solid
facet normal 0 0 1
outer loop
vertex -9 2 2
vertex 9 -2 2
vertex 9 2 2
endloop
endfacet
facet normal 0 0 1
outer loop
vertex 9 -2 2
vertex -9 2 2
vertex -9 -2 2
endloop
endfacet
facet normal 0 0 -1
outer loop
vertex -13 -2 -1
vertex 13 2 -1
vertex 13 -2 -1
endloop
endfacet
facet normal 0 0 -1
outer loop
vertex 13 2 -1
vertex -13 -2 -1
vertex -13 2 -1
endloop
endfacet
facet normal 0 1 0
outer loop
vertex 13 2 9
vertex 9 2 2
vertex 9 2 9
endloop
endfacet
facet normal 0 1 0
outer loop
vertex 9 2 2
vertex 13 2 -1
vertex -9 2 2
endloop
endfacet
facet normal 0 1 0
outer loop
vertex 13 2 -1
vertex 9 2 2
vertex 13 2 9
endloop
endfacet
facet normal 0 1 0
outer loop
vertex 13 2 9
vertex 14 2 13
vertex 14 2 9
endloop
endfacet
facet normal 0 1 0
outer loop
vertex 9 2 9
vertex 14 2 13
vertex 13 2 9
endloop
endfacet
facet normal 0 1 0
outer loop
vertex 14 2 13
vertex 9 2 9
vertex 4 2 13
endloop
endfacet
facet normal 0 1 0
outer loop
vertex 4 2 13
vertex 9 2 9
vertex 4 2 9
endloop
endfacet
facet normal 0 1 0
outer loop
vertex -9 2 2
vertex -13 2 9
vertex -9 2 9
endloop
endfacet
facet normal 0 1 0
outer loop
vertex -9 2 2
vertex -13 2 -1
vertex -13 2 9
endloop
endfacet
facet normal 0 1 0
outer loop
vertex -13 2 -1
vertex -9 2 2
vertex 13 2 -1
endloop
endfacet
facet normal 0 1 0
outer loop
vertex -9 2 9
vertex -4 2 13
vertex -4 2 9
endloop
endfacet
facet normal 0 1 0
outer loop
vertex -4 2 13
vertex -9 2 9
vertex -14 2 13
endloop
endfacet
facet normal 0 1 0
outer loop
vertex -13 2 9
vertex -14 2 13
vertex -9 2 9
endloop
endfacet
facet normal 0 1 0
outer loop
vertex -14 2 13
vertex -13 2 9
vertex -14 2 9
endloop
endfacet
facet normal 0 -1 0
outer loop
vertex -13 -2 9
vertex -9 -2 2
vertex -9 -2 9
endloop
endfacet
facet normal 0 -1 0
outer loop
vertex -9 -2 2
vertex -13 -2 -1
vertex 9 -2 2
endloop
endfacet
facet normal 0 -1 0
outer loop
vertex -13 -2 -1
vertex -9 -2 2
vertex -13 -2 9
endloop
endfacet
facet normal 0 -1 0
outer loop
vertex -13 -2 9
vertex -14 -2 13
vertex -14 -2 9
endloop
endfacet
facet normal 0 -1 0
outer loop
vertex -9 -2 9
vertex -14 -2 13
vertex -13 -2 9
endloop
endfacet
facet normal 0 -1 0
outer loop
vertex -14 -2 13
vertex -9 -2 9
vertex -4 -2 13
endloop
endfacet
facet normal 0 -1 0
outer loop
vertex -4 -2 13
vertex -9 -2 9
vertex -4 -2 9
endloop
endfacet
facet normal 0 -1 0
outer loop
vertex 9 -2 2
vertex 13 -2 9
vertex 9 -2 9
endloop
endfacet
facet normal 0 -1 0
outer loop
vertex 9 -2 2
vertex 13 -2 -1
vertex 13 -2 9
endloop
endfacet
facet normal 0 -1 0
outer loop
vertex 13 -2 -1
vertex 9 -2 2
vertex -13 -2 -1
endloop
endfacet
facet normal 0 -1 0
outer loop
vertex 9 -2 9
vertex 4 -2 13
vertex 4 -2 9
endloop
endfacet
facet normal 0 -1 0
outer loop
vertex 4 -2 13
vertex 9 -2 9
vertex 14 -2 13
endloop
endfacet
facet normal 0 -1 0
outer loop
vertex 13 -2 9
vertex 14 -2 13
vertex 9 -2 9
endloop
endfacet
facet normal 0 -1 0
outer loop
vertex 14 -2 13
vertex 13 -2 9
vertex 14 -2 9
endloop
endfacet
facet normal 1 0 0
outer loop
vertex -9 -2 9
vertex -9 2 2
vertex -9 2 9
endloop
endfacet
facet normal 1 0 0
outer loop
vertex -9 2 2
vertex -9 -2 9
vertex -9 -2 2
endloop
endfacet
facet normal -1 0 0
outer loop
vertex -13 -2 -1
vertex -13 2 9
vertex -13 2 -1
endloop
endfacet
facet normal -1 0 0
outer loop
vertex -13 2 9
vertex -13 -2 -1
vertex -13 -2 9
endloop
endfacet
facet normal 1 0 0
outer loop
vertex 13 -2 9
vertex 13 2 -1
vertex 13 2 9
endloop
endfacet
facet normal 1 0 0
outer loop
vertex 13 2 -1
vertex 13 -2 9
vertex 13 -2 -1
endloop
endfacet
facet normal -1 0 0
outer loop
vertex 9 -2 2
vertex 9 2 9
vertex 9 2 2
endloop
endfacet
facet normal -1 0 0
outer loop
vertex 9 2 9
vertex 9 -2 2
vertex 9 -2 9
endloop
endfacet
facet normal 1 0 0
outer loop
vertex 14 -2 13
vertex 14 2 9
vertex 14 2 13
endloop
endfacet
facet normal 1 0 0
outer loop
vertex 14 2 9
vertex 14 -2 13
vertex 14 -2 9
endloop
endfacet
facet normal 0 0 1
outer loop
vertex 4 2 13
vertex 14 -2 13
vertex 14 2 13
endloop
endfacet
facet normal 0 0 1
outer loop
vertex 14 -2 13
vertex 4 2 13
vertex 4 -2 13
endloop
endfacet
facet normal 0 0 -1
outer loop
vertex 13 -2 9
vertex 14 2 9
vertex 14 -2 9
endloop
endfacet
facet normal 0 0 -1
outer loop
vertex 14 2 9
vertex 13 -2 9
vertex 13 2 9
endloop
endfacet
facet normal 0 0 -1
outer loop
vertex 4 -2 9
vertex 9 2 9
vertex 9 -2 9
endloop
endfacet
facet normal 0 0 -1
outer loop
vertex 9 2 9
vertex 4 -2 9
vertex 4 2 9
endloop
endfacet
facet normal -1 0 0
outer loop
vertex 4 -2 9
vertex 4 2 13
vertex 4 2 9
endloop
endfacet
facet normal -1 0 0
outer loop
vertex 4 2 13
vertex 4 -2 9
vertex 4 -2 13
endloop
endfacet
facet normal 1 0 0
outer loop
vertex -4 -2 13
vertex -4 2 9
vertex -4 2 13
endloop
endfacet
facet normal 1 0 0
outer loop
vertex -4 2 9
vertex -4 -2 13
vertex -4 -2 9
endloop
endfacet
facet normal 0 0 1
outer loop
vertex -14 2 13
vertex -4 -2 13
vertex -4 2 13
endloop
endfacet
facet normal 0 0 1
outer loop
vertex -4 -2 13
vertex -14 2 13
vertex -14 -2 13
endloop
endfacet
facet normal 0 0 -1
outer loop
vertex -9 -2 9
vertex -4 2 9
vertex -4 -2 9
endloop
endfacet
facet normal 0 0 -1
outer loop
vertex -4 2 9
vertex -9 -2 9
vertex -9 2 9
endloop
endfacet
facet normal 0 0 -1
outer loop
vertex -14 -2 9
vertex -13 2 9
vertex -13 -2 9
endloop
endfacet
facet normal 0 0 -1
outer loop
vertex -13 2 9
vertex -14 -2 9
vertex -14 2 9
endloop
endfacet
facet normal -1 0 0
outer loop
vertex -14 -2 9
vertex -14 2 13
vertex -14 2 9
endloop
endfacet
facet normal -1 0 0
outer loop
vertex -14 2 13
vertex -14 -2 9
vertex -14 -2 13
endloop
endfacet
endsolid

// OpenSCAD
/*
 * Zwölf Tunken Adapter Clip
 * Copyright (c) 2025 Lone Dynamics Corporation. All rights reserved.
 *
 * This works best when printed with TPU filament.
 *
 */
 
 
tunken_clip();

//translate([0,0,8]) rotate([0,0,90]) zwolf();
//translate([0,0,5]) tunken();

module tunken_clip() {
 
    translate([0,0,0.5]) cube([20,4,3], center=true);
    translate([-16/2-3,0,5]) cube([4,4,12], center=true);
    translate([16/2+3,0,5]) cube([4,4,12], center=true);
     
    translate([16/2+1,0,11]) cube([10,4,4], center=true);
    translate([-16/2-1,0,11]) cube([10,4,4], center=true);
     
 }

module tunken() {
    color([1,0,0]) cube([16,16.5,5], center=true);
}
 
module zwolf(height = 1.6)
{
	 
	translate([0,-2.25,0])
		linear_extrude(1)
			text("zwölf", size=2, halign="center", font="Lato:style=Black");

	 difference() {
		 
		union () {
			color([0,1,0]) cube([16,13.5,height], center=true);
			translate([-6.35,4,0]) color([1,1,0]) cube([1.7,5,height+0.01], center=true);
			translate([-6.35,-4,-0.01]) color([1,1,0]) cube([1.7,5,height+0.01], center=true);
			translate([-3.81,4,0]) color([1,1,0]) cube([1.7,5,height+0.01], center=true);
			translate([-3.81,-4,-0.01]) color([1,1,0]) cube([1.7,5,height+0.01], center=true);
			translate([-1.27,4,0]) color([1,1,0]) cube([1.7,5,height+0.01], center=true);
			translate([-1.27,-4,-0.01]) color([1,1,0]) cube([1.7,5,height+0.01], center=true);
			translate([1.27,4,0]) color([1,1,0]) cube([1.7,5,height+0.01], center=true);
			translate([1.27,-4,-0.01]) color([1,1,0]) cube([1.7,5,height+0.01], center=true);
			translate([3.81,4,0]) color([1,1,0]) cube([1.7,5,height+0.01], center=true);
			translate([3.81,-4,-0.01]) color([1,1,0]) cube([1.7,5,height+0.01], center=true);
			translate([6.35,4,0]) color([1,1,0]) cube([1.7,5,height+0.01], center=true);
			translate([6.35,-4,-0.01]) color([1,1,0]) cube([1.7,5,height+0.01], center=true);
	   }
	 
		translate([-6.35,2.75,-1]) cylinder(d=1, h=10);		 
		translate([-6.35,2.75-7.62,-1]) cylinder(d=1, h=10);
		translate([-3.81,2.75,-1]) cylinder(d=1, h=10);
		translate([-3.81,2.75-7.62,-1]) cylinder(d=1, h=10);
		translate([-1.27,2.75,-1]) cylinder(d=1, h=10);
		translate([-1.27,2.75-7.62,-1]) cylinder(d=1, h=10);
		translate([1.27,2.75,-1]) cylinder(d=1, h=10);
		translate([1.27,2.75-7.62,-1]) cylinder(d=1, h=10);
		translate([3.81,2.75,-1]) cylinder(d=1, h=10);
		translate([3.81,2.75-7.62,-1]) cylinder(d=1, h=10);
		translate([6.35,2.75,-1]) cylinder(d=1, h=10);
		translate([6.35,2.75-7.62,-1]) cylinder(d=1, h=10);
		
	 }
 }
